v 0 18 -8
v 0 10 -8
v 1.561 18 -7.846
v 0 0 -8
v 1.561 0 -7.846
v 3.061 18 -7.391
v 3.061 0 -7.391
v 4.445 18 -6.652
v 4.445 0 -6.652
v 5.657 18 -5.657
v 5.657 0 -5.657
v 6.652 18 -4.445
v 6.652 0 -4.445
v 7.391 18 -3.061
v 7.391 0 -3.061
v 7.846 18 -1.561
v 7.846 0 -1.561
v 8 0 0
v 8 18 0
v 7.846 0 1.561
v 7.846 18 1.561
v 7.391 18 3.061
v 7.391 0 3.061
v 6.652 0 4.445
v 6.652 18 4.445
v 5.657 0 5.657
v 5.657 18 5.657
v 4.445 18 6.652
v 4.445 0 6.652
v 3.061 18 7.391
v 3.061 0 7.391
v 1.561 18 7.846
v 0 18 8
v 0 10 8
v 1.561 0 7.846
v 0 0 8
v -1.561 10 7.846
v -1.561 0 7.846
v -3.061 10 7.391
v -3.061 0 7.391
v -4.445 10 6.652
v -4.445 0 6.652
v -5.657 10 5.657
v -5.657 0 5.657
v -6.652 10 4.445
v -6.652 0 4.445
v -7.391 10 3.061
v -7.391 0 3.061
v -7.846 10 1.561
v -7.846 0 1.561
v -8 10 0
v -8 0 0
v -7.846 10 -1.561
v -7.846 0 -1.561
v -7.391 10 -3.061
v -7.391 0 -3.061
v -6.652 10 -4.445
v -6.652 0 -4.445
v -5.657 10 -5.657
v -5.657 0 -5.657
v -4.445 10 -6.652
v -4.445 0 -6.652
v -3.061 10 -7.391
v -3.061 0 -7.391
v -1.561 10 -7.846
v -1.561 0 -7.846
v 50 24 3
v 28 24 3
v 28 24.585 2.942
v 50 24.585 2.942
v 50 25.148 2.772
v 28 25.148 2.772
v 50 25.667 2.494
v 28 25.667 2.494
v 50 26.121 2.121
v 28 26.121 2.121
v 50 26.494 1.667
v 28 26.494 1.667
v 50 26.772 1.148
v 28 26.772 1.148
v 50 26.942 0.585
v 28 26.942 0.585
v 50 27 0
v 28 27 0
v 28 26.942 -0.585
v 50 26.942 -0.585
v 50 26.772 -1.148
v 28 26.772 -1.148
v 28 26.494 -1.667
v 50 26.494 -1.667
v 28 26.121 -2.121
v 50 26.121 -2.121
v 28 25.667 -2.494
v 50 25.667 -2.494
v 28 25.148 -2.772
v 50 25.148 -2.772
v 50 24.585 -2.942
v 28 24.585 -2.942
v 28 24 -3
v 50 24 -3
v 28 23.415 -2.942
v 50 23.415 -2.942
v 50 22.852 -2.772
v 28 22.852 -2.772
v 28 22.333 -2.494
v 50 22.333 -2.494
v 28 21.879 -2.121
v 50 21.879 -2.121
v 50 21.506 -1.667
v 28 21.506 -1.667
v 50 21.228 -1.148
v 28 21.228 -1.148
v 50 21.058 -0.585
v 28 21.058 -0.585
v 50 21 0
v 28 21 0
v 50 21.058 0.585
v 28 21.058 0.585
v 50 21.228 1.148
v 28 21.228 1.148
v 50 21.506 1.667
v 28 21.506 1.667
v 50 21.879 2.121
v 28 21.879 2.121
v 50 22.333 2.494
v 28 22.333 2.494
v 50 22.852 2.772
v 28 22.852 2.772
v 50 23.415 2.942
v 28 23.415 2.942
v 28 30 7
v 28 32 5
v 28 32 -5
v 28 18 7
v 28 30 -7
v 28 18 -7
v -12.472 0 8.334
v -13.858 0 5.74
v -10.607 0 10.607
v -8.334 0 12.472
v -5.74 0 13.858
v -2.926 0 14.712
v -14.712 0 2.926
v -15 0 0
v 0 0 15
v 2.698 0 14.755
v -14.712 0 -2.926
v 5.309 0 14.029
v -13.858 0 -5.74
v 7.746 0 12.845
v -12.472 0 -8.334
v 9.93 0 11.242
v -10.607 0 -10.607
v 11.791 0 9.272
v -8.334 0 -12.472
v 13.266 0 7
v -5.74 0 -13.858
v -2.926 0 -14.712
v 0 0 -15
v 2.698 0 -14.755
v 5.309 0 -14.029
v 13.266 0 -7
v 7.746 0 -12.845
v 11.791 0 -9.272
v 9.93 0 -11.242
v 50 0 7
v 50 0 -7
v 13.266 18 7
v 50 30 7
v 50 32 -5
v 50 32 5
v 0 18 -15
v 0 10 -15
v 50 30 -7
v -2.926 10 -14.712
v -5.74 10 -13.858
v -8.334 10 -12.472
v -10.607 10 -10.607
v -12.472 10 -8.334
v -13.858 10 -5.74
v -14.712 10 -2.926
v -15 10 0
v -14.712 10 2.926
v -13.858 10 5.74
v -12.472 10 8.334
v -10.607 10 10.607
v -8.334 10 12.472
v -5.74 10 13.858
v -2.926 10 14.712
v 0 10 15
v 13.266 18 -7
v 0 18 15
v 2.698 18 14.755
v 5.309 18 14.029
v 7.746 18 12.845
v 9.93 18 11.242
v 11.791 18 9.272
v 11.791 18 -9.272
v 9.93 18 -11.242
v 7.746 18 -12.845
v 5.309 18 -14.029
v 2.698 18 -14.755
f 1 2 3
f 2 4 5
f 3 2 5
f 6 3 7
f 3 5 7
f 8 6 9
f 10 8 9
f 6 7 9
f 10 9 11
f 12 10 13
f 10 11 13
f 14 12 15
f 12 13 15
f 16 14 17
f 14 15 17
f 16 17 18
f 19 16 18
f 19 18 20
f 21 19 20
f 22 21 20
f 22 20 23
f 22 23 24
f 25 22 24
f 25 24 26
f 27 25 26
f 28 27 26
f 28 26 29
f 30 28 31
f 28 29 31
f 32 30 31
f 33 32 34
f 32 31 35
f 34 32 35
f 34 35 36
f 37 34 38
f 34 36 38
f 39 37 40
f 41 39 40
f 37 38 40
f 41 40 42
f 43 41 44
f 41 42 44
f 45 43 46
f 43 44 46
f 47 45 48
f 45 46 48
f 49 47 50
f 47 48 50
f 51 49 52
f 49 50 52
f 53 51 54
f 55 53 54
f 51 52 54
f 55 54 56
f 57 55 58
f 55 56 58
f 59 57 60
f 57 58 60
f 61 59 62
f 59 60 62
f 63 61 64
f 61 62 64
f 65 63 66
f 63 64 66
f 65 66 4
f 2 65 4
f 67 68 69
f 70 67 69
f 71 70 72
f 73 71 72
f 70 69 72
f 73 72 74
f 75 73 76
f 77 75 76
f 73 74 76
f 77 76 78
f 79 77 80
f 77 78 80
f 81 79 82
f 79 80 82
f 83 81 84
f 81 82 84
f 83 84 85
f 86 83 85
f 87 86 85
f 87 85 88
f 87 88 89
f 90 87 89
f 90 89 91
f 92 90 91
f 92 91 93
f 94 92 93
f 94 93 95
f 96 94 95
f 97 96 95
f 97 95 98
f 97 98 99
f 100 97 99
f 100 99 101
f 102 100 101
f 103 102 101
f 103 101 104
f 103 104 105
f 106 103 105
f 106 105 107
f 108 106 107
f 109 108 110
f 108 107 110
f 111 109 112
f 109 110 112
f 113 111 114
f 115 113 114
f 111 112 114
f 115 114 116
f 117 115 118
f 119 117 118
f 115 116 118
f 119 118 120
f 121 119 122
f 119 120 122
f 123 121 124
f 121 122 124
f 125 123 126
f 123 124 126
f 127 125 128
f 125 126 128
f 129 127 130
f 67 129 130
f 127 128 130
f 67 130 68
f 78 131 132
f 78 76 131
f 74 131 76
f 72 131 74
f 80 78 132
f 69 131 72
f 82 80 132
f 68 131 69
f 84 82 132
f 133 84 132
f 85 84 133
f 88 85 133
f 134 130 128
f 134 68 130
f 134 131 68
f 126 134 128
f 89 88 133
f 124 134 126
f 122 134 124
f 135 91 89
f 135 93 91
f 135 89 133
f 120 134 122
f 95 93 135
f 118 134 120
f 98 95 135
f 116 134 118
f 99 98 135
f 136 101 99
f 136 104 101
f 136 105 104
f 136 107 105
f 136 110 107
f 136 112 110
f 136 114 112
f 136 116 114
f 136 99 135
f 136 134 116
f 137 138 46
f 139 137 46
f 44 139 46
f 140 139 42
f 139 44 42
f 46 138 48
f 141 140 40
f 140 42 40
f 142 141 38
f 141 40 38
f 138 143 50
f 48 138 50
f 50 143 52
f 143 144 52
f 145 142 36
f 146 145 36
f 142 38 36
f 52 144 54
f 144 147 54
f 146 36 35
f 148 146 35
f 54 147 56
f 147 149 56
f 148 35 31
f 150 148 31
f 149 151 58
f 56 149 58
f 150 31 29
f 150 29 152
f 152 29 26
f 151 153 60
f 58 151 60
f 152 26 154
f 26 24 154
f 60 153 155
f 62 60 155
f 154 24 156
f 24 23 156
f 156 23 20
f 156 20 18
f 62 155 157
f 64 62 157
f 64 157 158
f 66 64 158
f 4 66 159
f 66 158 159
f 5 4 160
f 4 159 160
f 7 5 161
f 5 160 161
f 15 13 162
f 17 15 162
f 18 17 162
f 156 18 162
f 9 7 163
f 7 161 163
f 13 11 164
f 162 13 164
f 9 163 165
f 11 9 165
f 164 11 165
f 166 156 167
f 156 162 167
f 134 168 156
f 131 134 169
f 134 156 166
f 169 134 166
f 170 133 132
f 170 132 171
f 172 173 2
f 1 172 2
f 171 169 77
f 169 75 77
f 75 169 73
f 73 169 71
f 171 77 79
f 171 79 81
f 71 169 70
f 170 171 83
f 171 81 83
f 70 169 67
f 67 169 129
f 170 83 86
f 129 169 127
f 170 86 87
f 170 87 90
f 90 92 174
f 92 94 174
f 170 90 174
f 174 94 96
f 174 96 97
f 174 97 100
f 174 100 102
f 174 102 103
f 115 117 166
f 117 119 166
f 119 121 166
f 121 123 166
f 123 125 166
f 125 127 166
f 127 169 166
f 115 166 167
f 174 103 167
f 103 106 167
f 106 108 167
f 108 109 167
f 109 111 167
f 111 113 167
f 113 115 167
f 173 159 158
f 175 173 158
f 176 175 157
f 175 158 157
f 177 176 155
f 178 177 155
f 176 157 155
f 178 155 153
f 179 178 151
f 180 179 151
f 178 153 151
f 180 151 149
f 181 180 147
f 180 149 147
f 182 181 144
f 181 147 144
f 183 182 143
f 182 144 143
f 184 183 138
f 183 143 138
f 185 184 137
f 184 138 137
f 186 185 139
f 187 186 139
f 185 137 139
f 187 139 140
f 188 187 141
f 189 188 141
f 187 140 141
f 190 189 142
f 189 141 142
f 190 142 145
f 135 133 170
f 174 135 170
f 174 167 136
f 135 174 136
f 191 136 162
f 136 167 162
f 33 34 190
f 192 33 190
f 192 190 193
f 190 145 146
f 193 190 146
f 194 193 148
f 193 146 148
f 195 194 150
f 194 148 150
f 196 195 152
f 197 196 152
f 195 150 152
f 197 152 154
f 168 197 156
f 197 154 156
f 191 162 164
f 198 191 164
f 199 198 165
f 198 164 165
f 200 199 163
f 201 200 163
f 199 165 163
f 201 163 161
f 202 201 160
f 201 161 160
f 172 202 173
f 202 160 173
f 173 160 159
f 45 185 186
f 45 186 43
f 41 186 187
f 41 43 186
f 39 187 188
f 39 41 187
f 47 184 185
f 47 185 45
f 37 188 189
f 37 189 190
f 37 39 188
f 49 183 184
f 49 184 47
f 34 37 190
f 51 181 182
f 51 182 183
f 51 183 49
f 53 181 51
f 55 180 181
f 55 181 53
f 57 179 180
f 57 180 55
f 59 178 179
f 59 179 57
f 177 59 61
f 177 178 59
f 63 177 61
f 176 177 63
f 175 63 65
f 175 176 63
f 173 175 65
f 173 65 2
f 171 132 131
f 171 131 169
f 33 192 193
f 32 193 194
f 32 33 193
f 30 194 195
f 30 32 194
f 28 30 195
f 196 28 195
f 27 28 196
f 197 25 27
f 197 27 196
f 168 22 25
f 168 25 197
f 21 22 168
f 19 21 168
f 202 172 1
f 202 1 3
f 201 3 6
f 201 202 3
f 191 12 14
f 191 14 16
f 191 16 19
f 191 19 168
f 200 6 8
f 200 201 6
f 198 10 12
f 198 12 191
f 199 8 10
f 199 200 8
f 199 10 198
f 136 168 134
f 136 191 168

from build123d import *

# Parameters (mm, degrees)
SKETCH1_R           = 8
BOSS_EXTRUDE1_DEPTH = 10
BOSS_EXTRUDE2_DEPTH = 18
SKETCH1_4_W         = 22
SKETCH1_4_H         = 14
BOSS_EXTRUDE3_DEPTH = 32
CHAMFER1_SIZE       = 2
SKETCH2_R           = 3
CUT_EXTRUDE1_DEPTH  = 56.6596802


with BuildPart() as part:
    # Sketch1 → Boss-Extrude1 (new body)
    with BuildSketch(Plane(origin=(0, 0, 0), x_dir=(1, 0, 0), z_dir=(0, 1, 0))):
        with BuildLine():
            ThreePointArc((13.266499161, 7), (-15, 0), (13.266499161, -7))
            Line((13.266499161, -7), (50, -7))
            Line((50, -7), (50, 7))
            Line((50, 7), (13.266499161, 7))
        make_face()
        Circle(SKETCH1_R, mode=Mode.SUBTRACT)
    extrude(amount=BOSS_EXTRUDE1_DEPTH)

    # Sketch1<3> → Boss-Extrude2 (add)
    with BuildSketch(Plane(origin=(0, 0, 0), x_dir=(1, 0, 0), z_dir=(0, 1, 0))):
        with BuildLine():
            ThreePointArc((13.266499161, 7), (7.745966692, 12.845232579), (0, 15))
            Line((0, 15), (0, 8))
            ThreePointArc((0, 8), (8, 0), (0, -8))
            Line((0, -8), (0, -15))
            ThreePointArc((0, -15), (7.745966692, -12.845232579), (13.266499161, -7))
            Line((13.266499161, -7), (50, -7))
            Line((50, -7), (50, 7))
            Line((50, 7), (13.266499161, 7))
        make_face()
    extrude(amount=BOSS_EXTRUDE2_DEPTH)

    # Sketch1<4> → Boss-Extrude3 (add)
    with BuildSketch(Plane(origin=(0, 0, 0), x_dir=(1, 0, 0), z_dir=(0, 1, 0))):
        with Locations((39, 0)):
            Rectangle(SKETCH1_4_W, SKETCH1_4_H)
    extrude(amount=BOSS_EXTRUDE3_DEPTH)

    # Chamfer1
    chamfer1_edges = [part.edges().sort_by_distance(p)[0] for p in [
        (39, 32, -7),
        (39, 32, 7),
    ]]
    chamfer(chamfer1_edges, length=CHAMFER1_SIZE)

    # Sketch2 → Cut-Extrude1 (cut, through all)
    with BuildSketch(Plane.ZY.offset(-28)):
        with Locations((0, 24)):
            Circle(SKETCH2_R)
    extrude(amount=-CUT_EXTRUDE1_DEPTH, mode=Mode.SUBTRACT)


solid = part.part
